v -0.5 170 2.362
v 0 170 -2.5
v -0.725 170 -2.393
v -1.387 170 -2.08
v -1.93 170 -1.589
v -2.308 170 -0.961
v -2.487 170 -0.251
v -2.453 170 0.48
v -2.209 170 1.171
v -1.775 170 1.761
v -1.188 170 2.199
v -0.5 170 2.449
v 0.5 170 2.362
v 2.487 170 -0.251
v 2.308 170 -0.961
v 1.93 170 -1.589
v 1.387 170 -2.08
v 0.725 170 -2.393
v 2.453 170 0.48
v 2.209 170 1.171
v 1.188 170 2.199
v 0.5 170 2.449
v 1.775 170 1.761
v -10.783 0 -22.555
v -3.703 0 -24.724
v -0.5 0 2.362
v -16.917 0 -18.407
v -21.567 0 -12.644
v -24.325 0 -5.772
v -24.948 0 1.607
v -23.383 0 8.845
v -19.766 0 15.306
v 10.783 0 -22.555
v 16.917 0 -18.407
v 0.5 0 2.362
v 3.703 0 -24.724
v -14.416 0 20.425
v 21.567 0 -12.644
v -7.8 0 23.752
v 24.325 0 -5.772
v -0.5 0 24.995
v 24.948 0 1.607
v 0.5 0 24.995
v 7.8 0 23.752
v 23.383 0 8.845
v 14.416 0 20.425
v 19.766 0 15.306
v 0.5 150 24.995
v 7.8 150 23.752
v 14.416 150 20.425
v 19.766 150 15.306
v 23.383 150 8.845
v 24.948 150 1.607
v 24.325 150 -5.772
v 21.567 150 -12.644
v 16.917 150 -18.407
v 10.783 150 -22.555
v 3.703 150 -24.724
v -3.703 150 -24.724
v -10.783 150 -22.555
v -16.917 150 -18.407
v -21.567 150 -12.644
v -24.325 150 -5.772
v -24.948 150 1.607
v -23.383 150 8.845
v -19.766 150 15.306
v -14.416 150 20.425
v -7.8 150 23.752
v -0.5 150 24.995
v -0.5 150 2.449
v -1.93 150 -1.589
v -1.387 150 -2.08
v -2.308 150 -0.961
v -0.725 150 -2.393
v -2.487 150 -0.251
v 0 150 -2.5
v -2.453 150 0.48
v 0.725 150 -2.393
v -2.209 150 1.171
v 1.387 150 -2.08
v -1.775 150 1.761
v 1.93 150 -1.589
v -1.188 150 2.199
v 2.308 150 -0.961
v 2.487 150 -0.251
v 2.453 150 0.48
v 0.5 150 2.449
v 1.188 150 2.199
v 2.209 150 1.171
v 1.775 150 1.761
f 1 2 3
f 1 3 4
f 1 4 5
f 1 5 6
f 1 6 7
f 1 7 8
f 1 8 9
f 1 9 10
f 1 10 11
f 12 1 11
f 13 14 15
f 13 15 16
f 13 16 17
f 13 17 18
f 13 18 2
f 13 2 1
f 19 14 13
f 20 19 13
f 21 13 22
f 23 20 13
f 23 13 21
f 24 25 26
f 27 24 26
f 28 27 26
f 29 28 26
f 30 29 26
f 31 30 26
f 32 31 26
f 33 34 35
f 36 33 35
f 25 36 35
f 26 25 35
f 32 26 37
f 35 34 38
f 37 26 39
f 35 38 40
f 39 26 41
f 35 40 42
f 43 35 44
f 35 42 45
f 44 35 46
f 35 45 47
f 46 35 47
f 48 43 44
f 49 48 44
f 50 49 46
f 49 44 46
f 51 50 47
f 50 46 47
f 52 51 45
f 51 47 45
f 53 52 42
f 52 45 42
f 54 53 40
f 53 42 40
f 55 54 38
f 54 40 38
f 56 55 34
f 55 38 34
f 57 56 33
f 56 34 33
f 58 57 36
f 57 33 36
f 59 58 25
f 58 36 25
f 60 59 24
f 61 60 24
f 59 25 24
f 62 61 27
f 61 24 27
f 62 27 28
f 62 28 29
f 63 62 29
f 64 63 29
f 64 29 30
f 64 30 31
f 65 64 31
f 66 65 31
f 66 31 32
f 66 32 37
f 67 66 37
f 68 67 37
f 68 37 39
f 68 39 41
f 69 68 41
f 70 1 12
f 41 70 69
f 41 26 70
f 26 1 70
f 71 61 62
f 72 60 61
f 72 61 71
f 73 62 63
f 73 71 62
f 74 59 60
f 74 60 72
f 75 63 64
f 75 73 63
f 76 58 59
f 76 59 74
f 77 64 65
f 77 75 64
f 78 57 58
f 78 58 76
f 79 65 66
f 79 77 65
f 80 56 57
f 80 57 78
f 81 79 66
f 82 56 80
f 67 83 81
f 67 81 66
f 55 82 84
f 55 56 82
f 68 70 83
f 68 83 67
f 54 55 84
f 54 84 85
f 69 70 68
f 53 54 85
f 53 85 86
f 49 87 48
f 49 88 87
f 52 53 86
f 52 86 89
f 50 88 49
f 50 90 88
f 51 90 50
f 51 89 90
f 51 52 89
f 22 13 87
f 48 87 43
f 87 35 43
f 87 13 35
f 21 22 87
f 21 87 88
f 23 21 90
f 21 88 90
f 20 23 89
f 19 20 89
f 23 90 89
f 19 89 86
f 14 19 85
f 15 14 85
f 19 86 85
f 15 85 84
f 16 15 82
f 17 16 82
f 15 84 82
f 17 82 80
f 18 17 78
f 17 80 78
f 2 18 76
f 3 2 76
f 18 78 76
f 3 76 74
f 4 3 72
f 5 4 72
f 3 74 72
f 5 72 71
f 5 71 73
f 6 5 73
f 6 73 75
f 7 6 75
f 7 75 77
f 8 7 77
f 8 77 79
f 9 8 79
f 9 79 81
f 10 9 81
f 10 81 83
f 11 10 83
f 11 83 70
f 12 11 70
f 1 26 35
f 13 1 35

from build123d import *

# Parameters (mm, degrees)
SKETCH1_R           = 25
BOSS_EXTRUDE1_DEPTH = 150
SKETCH2_R           = 2.5
BOSS_EXTRUDE2_DEPTH = 20
SKETCH3_W           = 1
SKETCH3_H           = 26.625756483
CUT_EXTRUDE1_DEPTH  = 174.637553542


with BuildPart() as part:
    # Sketch1 → Boss-Extrude1 (new body)
    with BuildSketch(Plane(origin=(0, 0, 0), x_dir=(1, 0, 0), z_dir=(0, 1, 0))):
        with Locations(Location((0, 0, 0), (0, 0, 270))):
            Circle(SKETCH1_R)
    extrude(amount=BOSS_EXTRUDE1_DEPTH)

    # Sketch2 → Boss-Extrude2 (add)
    with BuildSketch(Plane(origin=(0, 150, 0), x_dir=(1, 0, 0), z_dir=(0, 1, 0))):
        with Locations(Location((0, 0, 0), (0, 0, 270))):
            Circle(SKETCH2_R)
    extrude(amount=BOSS_EXTRUDE2_DEPTH)

    # Sketch3 → Cut-Extrude1 (cut, through all)
    with BuildSketch(Plane.XZ):
        with Locations((0, 15.674840511)):
            Rectangle(SKETCH3_W, SKETCH3_H)
    extrude(amount=-CUT_EXTRUDE1_DEPTH, mode=Mode.SUBTRACT)


solid = part.part
